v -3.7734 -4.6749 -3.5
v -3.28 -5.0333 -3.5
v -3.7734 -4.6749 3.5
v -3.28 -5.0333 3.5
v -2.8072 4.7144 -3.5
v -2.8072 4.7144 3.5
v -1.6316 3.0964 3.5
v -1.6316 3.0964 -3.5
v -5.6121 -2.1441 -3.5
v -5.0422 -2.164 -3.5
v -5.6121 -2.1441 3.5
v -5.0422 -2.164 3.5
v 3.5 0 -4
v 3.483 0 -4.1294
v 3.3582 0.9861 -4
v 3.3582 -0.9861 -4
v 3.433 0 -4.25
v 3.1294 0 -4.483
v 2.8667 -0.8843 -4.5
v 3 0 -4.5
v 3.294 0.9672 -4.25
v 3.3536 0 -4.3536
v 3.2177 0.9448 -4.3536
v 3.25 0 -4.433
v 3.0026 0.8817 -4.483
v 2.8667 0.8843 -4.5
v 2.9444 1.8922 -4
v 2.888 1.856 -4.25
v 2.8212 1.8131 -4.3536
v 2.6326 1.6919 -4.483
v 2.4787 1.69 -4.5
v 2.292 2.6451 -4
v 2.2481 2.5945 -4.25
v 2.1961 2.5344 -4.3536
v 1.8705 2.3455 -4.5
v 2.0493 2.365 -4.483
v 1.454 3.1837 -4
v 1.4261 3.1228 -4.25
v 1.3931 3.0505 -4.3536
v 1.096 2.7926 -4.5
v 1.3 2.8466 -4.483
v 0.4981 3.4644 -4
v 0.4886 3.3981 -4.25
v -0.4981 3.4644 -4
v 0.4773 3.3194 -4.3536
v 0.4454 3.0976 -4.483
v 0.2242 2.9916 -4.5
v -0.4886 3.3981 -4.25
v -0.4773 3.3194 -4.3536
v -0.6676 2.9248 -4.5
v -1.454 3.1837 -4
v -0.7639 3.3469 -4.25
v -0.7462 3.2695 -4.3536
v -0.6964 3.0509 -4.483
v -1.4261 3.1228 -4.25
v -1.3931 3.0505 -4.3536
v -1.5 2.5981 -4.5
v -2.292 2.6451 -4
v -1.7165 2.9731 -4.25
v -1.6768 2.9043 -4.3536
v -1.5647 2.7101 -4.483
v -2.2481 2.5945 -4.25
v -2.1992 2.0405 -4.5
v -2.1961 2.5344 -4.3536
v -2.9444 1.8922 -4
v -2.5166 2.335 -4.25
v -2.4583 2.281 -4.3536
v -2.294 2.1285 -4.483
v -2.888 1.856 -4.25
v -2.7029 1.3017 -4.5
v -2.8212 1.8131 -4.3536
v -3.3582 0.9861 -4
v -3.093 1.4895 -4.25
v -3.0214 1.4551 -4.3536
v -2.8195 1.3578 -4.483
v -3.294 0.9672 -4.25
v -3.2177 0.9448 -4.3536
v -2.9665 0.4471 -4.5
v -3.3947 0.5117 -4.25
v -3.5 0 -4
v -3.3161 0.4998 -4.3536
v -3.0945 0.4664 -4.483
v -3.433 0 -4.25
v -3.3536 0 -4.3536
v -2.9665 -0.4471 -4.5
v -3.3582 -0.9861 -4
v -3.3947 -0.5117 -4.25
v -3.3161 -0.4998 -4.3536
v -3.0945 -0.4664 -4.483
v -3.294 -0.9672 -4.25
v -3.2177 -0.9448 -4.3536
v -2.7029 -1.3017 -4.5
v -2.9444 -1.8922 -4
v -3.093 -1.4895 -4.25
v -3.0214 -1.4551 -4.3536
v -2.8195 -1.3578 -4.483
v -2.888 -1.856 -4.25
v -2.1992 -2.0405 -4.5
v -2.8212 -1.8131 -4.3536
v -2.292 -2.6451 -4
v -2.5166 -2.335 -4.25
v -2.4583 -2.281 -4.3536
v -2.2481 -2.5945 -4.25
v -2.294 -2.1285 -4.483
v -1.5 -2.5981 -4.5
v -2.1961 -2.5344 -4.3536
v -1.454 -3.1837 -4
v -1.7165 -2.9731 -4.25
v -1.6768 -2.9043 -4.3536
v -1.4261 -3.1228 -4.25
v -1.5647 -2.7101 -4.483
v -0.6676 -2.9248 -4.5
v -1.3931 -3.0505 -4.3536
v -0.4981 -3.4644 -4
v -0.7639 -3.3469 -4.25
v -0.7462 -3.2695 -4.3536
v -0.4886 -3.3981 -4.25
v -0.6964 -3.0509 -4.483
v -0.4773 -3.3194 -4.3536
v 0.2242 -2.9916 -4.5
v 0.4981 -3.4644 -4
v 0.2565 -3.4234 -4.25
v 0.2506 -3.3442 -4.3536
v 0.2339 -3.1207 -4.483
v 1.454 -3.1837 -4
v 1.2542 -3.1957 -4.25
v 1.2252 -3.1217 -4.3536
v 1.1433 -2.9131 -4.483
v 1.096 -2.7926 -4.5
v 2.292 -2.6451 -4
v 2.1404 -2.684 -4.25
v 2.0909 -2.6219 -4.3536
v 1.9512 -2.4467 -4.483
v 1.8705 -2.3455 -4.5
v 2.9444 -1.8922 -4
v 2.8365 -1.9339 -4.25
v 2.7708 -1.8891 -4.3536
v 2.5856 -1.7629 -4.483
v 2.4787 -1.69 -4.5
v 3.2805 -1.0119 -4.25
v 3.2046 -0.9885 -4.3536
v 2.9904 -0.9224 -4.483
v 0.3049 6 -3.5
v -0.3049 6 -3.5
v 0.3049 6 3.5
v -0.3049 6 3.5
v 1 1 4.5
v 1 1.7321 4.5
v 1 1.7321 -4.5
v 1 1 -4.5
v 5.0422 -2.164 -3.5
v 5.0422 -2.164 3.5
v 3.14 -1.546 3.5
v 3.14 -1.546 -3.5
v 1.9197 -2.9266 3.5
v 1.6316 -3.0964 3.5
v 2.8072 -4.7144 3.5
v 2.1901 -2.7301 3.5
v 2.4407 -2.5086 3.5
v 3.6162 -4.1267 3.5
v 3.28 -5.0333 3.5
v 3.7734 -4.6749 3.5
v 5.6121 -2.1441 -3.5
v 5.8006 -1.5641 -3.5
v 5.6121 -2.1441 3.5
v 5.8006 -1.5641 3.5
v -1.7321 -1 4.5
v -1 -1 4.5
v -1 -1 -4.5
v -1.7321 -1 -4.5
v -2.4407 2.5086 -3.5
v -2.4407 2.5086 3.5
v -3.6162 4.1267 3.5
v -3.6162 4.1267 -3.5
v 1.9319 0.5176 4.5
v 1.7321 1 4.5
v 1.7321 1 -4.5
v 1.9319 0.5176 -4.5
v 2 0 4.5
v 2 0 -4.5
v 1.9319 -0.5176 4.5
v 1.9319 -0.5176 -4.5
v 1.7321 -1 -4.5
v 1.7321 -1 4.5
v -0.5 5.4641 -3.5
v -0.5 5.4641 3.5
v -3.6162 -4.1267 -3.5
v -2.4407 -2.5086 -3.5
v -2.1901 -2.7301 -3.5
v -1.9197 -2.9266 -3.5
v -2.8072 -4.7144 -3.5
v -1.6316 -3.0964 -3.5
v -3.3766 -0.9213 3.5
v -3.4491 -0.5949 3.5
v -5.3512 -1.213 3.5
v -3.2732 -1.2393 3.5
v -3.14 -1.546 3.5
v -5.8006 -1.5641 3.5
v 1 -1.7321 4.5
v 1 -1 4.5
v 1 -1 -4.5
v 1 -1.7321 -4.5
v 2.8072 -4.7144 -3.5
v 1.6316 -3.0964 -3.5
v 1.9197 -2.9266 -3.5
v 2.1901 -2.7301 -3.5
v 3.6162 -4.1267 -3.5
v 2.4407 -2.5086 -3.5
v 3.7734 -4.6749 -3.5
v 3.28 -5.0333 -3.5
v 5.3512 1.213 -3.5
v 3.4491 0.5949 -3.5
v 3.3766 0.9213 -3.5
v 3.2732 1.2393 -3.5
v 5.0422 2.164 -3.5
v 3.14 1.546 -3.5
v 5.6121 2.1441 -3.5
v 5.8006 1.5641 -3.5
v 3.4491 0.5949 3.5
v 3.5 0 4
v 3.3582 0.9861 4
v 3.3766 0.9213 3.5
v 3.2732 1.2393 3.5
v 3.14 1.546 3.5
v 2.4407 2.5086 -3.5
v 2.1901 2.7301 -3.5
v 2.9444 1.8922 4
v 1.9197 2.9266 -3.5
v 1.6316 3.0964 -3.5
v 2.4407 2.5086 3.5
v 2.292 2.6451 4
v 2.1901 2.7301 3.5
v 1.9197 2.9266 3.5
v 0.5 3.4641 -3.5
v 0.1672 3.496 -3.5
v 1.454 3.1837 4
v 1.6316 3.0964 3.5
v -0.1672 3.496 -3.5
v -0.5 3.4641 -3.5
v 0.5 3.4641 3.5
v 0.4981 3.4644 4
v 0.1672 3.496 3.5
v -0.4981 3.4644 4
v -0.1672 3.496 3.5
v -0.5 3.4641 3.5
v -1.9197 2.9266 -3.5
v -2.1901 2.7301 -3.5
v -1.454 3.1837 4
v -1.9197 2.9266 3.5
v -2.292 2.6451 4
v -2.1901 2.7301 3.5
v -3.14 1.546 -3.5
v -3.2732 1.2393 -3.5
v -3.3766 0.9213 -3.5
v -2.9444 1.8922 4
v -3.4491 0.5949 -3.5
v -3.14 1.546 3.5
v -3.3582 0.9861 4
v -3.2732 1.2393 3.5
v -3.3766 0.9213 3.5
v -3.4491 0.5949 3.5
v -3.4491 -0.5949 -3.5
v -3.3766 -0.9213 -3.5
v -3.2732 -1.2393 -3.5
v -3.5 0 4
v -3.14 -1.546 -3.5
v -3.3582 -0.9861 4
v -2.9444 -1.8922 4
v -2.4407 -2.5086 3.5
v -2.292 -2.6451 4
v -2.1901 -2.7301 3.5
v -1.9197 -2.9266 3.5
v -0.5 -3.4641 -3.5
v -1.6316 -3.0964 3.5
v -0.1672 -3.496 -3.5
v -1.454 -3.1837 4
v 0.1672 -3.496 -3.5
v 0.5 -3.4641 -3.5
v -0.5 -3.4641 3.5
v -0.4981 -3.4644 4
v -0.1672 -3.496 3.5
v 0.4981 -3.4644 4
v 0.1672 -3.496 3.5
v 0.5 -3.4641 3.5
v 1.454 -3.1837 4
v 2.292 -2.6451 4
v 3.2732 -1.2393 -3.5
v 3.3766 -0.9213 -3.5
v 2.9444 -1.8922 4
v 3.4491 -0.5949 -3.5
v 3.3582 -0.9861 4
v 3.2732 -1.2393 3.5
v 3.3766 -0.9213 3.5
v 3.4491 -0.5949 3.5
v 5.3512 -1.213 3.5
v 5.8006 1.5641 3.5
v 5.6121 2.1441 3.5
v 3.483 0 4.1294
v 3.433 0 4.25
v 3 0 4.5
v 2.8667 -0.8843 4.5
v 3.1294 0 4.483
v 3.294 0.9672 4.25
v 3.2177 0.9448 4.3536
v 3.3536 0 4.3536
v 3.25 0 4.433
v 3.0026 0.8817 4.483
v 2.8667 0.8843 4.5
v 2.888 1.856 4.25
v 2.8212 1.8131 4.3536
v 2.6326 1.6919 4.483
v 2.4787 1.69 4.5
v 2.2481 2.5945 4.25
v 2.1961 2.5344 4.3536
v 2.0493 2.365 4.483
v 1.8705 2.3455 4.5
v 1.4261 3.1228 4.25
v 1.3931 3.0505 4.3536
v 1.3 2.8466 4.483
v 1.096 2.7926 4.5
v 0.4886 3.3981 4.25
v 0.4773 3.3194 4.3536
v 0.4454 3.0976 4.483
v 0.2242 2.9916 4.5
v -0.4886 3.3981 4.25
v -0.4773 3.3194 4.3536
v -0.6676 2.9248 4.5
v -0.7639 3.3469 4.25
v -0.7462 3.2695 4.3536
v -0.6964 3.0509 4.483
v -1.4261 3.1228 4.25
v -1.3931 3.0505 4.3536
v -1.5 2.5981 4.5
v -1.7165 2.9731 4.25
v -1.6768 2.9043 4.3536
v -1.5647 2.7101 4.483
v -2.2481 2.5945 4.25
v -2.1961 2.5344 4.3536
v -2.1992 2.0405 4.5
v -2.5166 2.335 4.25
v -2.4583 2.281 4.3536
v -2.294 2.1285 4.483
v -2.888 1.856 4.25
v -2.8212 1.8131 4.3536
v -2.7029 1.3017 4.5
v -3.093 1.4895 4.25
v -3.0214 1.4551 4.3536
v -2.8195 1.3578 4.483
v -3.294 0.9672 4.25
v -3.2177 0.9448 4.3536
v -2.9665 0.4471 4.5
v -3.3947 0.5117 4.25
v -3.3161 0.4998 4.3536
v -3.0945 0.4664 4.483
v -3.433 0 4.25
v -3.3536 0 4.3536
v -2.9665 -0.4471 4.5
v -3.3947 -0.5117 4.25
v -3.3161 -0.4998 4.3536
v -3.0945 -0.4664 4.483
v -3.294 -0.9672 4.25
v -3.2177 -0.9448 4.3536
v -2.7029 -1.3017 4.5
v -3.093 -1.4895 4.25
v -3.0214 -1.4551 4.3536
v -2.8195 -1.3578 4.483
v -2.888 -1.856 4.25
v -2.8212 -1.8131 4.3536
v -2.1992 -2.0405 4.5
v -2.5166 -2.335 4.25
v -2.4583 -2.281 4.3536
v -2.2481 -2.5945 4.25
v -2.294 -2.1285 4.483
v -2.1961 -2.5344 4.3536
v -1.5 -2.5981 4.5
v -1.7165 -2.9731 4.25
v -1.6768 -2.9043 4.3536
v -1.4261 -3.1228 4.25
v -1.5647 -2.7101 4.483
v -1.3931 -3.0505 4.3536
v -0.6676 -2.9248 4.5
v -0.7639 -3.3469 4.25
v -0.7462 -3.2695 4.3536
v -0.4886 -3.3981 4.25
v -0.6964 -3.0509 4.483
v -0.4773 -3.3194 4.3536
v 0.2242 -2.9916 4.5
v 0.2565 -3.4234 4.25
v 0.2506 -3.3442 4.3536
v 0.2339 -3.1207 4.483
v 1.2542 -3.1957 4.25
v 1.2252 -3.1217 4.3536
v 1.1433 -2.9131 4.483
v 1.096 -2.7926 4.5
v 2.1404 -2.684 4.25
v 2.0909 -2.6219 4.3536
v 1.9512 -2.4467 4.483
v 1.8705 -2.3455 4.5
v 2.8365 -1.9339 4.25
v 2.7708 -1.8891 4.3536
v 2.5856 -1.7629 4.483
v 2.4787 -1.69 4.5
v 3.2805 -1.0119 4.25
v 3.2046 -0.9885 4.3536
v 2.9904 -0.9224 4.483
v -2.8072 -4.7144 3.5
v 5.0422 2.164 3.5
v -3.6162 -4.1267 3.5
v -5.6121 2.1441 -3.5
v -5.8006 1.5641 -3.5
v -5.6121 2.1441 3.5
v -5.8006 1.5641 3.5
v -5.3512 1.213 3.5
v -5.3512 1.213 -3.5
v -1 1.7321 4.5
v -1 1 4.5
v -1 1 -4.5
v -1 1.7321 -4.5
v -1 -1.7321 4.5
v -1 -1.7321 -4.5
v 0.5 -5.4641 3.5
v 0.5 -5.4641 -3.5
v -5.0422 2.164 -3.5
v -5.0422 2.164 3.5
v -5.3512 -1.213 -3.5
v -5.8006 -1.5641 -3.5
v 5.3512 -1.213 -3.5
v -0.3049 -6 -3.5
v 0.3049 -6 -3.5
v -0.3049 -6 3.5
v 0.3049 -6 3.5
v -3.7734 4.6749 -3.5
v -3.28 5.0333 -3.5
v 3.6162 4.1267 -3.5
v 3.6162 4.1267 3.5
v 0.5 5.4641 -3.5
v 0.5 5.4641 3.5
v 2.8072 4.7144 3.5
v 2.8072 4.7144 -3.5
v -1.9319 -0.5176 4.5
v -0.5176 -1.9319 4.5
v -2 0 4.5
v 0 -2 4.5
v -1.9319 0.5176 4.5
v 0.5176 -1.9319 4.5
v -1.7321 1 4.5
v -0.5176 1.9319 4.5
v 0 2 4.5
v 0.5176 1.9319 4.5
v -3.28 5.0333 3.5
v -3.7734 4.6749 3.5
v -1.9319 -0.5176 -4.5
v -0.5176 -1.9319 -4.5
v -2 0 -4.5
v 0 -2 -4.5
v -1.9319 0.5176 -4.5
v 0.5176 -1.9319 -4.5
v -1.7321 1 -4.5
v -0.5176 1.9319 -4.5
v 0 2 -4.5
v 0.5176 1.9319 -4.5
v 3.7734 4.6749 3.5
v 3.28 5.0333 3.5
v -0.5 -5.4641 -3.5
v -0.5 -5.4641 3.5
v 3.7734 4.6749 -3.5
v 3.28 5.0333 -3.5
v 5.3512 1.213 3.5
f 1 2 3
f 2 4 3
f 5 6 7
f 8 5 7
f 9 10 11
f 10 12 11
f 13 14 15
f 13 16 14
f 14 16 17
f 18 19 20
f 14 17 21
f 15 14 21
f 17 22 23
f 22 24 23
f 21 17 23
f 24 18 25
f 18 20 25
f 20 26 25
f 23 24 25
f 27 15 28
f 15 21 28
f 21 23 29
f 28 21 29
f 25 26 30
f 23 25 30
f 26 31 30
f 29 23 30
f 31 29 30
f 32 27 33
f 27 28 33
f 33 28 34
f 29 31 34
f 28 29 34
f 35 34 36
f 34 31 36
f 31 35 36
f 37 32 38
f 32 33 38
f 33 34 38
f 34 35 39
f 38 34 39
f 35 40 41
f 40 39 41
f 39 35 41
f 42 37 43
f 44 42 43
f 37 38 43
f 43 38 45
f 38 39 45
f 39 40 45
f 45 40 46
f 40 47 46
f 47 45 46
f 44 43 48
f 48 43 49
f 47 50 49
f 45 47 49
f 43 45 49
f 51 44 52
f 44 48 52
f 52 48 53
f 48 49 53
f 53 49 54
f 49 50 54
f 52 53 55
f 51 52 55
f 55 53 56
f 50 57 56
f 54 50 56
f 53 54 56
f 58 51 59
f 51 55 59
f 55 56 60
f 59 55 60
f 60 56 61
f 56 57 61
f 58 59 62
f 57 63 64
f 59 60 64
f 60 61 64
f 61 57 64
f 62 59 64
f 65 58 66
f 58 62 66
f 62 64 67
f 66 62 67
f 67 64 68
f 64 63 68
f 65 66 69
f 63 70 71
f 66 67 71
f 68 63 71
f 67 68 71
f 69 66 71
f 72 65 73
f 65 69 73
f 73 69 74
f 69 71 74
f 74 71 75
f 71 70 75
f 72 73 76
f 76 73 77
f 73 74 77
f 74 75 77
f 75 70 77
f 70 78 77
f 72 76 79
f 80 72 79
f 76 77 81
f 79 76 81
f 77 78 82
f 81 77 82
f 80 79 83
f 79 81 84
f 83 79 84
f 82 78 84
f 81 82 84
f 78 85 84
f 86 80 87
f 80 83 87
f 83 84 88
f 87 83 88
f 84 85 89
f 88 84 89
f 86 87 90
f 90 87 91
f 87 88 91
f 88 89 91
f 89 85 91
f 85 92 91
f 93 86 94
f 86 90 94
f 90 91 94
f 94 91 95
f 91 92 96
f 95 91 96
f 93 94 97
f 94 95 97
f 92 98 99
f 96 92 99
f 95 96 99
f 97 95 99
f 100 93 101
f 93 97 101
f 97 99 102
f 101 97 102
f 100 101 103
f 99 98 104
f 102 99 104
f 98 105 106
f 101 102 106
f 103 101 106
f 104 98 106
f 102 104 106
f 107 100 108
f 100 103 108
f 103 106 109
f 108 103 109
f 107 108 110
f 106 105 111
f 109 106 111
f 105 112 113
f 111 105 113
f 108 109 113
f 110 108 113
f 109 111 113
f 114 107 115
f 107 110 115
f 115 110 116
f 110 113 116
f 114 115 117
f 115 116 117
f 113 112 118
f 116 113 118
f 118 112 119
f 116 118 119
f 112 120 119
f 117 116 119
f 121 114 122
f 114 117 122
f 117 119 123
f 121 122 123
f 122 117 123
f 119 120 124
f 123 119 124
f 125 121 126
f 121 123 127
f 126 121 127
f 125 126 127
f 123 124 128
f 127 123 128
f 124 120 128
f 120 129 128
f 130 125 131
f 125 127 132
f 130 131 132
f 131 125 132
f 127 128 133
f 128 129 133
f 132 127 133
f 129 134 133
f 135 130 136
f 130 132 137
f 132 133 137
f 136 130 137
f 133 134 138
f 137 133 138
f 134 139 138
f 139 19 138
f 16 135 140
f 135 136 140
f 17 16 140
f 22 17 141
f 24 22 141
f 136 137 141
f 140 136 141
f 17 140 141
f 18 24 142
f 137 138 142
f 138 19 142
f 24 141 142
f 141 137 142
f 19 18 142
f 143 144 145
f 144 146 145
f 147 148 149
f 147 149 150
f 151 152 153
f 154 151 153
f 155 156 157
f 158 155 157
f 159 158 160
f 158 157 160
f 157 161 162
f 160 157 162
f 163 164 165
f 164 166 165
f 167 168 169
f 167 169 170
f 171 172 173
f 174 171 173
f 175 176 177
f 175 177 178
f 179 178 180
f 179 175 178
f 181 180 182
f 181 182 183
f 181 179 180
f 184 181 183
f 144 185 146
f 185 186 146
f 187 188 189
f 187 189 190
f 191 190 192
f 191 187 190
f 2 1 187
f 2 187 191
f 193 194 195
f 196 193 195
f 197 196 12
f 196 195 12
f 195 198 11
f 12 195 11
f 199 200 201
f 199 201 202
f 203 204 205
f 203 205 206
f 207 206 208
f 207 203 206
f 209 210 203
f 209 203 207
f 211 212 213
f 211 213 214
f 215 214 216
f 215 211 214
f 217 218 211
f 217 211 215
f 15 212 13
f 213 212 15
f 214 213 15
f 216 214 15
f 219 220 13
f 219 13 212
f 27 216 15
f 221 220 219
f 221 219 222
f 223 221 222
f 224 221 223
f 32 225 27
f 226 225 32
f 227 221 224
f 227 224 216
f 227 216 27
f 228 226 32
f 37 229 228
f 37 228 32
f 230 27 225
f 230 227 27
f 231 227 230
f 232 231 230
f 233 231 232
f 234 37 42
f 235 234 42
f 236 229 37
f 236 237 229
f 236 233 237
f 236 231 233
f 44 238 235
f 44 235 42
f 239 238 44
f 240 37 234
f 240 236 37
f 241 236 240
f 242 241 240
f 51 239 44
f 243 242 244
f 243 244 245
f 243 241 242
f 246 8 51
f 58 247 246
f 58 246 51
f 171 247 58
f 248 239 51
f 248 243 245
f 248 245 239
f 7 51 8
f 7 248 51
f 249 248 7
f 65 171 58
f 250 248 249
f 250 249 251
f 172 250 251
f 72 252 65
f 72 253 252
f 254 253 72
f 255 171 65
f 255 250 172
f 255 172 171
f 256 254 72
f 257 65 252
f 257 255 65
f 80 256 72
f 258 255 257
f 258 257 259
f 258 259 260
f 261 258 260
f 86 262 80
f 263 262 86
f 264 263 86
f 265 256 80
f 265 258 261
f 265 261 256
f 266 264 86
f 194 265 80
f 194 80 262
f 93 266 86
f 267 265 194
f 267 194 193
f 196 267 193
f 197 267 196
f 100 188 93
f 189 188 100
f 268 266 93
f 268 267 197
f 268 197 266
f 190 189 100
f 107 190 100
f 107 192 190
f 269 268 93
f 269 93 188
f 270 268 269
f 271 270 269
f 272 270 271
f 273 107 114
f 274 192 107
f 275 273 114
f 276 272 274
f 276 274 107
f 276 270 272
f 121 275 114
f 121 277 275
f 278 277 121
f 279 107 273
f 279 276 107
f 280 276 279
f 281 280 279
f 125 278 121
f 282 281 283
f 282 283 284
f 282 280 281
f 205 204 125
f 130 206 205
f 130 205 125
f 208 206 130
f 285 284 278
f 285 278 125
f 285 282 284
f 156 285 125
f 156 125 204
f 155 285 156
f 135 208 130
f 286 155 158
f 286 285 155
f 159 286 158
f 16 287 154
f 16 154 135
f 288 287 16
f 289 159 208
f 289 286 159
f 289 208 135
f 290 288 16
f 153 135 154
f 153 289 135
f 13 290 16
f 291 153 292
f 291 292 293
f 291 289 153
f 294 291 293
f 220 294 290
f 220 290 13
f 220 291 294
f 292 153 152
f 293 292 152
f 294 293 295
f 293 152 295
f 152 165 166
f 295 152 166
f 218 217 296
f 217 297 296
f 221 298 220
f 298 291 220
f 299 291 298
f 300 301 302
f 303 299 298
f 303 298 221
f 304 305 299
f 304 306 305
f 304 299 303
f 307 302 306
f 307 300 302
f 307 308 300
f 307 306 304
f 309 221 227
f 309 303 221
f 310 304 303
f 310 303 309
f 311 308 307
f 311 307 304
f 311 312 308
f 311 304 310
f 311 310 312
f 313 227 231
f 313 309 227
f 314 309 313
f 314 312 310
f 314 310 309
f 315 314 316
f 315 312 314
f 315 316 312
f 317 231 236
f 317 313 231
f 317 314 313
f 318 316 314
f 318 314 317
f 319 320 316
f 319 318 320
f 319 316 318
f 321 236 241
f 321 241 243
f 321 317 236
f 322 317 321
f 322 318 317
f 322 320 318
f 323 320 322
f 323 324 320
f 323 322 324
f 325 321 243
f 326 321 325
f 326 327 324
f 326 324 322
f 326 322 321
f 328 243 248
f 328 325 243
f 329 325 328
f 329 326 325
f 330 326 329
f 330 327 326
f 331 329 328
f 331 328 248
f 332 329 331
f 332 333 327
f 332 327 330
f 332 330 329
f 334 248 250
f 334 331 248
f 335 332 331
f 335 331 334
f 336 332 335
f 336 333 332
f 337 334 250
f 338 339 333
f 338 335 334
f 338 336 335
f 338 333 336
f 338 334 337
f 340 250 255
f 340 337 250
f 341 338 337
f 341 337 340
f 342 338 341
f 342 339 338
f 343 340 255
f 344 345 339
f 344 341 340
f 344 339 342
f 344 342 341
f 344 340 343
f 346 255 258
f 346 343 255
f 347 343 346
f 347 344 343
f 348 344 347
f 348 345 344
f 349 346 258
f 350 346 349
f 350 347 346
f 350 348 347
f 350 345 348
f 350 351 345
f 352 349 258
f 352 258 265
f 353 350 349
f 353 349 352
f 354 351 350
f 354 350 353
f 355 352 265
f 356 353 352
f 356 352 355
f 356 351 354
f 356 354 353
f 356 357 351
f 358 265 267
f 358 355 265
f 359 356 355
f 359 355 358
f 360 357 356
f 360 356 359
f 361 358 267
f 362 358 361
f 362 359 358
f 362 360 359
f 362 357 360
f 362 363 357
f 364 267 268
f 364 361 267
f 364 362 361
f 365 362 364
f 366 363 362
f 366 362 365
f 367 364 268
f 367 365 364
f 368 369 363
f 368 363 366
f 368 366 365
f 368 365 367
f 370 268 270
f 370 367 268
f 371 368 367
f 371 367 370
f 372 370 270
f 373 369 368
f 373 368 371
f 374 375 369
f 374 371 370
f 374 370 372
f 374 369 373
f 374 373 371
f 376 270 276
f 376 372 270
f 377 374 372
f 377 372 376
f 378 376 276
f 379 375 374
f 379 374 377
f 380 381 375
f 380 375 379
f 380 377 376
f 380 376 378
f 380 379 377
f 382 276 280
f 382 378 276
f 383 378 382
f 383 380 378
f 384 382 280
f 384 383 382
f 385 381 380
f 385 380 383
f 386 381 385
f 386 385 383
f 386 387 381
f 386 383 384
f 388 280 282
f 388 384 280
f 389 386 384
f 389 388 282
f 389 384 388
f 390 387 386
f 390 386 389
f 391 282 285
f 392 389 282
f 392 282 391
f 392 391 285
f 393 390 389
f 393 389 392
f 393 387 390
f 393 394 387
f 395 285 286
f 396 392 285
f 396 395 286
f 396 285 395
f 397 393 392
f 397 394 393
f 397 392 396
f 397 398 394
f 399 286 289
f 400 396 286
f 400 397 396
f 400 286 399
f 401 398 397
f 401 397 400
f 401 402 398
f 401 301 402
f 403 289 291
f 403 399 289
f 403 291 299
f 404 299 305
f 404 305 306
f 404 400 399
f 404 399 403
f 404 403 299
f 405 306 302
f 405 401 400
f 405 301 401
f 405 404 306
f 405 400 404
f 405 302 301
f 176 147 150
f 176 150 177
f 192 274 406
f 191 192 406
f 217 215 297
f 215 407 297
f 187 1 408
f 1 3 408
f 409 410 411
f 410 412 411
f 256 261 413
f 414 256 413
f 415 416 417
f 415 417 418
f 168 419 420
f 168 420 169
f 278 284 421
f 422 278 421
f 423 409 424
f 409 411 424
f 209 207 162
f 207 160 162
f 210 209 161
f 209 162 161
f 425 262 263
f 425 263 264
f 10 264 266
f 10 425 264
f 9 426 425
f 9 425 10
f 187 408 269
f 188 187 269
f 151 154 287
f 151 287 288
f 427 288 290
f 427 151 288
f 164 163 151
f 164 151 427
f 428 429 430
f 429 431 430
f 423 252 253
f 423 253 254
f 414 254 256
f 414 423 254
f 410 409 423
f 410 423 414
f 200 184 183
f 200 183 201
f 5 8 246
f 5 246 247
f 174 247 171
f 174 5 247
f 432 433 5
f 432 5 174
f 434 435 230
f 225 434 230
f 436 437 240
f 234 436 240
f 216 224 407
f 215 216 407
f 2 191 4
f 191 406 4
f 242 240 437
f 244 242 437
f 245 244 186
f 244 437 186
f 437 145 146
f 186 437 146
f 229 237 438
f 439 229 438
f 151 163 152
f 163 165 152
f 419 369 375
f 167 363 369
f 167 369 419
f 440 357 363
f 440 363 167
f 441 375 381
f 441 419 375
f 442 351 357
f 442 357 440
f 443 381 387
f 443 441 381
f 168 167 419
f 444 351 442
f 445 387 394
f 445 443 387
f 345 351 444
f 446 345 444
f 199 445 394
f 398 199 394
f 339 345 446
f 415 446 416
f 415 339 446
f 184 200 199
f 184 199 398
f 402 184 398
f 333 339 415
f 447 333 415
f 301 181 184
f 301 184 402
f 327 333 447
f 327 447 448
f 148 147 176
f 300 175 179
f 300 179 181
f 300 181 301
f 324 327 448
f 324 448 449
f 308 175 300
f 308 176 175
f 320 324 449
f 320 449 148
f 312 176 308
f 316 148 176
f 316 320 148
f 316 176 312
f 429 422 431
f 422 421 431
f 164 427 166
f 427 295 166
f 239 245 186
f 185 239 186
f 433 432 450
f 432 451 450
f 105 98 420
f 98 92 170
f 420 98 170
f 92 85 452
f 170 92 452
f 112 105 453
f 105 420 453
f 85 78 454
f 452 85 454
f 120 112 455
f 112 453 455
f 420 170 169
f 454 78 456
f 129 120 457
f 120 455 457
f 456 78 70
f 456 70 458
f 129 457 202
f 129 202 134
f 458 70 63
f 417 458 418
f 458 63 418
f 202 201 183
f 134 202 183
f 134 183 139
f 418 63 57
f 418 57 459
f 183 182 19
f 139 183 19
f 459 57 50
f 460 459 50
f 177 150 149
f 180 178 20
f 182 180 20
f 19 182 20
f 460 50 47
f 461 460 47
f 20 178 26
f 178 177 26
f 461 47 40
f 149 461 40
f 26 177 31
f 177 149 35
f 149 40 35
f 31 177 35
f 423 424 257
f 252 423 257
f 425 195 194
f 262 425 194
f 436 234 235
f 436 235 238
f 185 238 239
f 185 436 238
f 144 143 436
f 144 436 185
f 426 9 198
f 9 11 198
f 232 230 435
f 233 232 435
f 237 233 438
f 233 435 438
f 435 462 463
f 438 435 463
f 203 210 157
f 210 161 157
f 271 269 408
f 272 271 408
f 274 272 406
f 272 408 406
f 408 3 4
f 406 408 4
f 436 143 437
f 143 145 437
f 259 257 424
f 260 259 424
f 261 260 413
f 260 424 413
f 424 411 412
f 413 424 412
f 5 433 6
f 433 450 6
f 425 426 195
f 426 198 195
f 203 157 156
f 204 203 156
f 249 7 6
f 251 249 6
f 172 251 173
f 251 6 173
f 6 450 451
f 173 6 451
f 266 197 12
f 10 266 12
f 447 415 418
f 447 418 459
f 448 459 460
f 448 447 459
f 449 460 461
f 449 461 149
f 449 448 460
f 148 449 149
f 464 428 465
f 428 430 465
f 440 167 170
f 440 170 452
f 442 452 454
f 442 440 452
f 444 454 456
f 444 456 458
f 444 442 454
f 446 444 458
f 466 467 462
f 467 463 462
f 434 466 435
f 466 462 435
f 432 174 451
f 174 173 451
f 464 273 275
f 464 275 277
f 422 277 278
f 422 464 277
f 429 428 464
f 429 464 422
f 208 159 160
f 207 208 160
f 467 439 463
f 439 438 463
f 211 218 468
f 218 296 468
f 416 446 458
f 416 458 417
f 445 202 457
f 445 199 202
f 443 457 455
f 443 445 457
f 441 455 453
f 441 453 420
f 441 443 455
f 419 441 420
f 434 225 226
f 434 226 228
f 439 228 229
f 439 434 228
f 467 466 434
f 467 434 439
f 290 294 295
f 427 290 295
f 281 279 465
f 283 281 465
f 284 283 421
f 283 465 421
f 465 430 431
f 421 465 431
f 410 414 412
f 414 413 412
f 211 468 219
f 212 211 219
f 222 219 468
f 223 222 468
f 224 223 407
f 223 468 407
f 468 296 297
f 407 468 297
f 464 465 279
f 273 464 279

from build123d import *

# Parameters (mm, degrees)
SKETCH1_R           = 3.5
SKETCH1_R_2         = 2
BOSS_EXTRUDE1_DEPTH = 4.5
BOSS_EXTRUDE2_DEPTH = 3.5
CIRPATTERN1_COUNT   = 10
FILLET1_R           = 0.5


with BuildPart() as part:
    # Sketch1 → Boss-Extrude1 (new body, symmetric)
    with BuildSketch(Plane.XY):
        Circle(SKETCH1_R)
        Circle(SKETCH1_R_2, mode=Mode.SUBTRACT)
        with BuildLine():
            Line((1, -1), (1, -1.732050808))
            ThreePointArc((1, -1.732050808), (1.414213562, -1.414213562), (1.732050808, -1))
            Line((1.732050808, -1), (1, -1))
        make_face()
        with BuildLine():
            ThreePointArc((-1.732050808, -1), (-1.414213562, -1.414213562), (-1, -1.732050808))
            Line((-1, -1.732050808), (-1, -1))
            Line((-1, -1), (-1.732050808, -1))
        make_face()
        with BuildLine():
            Line((-1.732050808, 1), (-1, 1))
            Line((-1, 1), (-1, 1.732050808))
            ThreePointArc((-1, 1.732050808), (-1.414213562, 1.414213562), (-1.732050808, 1))
        make_face()
        with BuildLine():
            Line((1, 1.732050808), (1, 1))
            Line((1, 1), (1.732050808, 1))
            ThreePointArc((1.732050808, 1), (1.414213562, 1.414213562), (1, 1.732050808))
        make_face()
    extrude(amount=BOSS_EXTRUDE1_DEPTH, both=True)

    # Sketch2 → Boss-Extrude2 (add, symmetric)
    with BuildSketch(Plane.XY):
        with BuildLine():
            Line((-0.5, 3.464101615), (-0.5, 5.464101615))
            Line((-0.5, 5.464101615), (-0.304948939, 6))
            Line((-0.304948939, 6), (0.304948939, 6))
            Line((0.304948939, 6), (0.5, 5.464101615))
            Line((0.5, 5.464101615), (0.5, 3.464101615))
            ThreePointArc((0.5, 3.464101615), (0, 3.5), (-0.5, 3.464101615))
        make_face()
    boss_extrude2 = extrude(amount=BOSS_EXTRUDE2_DEPTH, both=True)

    # CirPattern1: Boss-Extrude2 ×10 about axis
    cirpattern1_axis = Axis((0, 0, 0), (0, 0, 1))
    for i in range(1, CIRPATTERN1_COUNT):
        add(boss_extrude2.rotate(cirpattern1_axis, i * 360 / CIRPATTERN1_COUNT))

    # Fillet1
    fillet1_edges = [part.edges().sort_by_distance(p)[0] for p in [
        (-3.5, 0, -4.5),
        (-3.5, 0, 4.5),
    ]]
    fillet(fillet1_edges, radius=FILLET1_R)


solid = part.part
